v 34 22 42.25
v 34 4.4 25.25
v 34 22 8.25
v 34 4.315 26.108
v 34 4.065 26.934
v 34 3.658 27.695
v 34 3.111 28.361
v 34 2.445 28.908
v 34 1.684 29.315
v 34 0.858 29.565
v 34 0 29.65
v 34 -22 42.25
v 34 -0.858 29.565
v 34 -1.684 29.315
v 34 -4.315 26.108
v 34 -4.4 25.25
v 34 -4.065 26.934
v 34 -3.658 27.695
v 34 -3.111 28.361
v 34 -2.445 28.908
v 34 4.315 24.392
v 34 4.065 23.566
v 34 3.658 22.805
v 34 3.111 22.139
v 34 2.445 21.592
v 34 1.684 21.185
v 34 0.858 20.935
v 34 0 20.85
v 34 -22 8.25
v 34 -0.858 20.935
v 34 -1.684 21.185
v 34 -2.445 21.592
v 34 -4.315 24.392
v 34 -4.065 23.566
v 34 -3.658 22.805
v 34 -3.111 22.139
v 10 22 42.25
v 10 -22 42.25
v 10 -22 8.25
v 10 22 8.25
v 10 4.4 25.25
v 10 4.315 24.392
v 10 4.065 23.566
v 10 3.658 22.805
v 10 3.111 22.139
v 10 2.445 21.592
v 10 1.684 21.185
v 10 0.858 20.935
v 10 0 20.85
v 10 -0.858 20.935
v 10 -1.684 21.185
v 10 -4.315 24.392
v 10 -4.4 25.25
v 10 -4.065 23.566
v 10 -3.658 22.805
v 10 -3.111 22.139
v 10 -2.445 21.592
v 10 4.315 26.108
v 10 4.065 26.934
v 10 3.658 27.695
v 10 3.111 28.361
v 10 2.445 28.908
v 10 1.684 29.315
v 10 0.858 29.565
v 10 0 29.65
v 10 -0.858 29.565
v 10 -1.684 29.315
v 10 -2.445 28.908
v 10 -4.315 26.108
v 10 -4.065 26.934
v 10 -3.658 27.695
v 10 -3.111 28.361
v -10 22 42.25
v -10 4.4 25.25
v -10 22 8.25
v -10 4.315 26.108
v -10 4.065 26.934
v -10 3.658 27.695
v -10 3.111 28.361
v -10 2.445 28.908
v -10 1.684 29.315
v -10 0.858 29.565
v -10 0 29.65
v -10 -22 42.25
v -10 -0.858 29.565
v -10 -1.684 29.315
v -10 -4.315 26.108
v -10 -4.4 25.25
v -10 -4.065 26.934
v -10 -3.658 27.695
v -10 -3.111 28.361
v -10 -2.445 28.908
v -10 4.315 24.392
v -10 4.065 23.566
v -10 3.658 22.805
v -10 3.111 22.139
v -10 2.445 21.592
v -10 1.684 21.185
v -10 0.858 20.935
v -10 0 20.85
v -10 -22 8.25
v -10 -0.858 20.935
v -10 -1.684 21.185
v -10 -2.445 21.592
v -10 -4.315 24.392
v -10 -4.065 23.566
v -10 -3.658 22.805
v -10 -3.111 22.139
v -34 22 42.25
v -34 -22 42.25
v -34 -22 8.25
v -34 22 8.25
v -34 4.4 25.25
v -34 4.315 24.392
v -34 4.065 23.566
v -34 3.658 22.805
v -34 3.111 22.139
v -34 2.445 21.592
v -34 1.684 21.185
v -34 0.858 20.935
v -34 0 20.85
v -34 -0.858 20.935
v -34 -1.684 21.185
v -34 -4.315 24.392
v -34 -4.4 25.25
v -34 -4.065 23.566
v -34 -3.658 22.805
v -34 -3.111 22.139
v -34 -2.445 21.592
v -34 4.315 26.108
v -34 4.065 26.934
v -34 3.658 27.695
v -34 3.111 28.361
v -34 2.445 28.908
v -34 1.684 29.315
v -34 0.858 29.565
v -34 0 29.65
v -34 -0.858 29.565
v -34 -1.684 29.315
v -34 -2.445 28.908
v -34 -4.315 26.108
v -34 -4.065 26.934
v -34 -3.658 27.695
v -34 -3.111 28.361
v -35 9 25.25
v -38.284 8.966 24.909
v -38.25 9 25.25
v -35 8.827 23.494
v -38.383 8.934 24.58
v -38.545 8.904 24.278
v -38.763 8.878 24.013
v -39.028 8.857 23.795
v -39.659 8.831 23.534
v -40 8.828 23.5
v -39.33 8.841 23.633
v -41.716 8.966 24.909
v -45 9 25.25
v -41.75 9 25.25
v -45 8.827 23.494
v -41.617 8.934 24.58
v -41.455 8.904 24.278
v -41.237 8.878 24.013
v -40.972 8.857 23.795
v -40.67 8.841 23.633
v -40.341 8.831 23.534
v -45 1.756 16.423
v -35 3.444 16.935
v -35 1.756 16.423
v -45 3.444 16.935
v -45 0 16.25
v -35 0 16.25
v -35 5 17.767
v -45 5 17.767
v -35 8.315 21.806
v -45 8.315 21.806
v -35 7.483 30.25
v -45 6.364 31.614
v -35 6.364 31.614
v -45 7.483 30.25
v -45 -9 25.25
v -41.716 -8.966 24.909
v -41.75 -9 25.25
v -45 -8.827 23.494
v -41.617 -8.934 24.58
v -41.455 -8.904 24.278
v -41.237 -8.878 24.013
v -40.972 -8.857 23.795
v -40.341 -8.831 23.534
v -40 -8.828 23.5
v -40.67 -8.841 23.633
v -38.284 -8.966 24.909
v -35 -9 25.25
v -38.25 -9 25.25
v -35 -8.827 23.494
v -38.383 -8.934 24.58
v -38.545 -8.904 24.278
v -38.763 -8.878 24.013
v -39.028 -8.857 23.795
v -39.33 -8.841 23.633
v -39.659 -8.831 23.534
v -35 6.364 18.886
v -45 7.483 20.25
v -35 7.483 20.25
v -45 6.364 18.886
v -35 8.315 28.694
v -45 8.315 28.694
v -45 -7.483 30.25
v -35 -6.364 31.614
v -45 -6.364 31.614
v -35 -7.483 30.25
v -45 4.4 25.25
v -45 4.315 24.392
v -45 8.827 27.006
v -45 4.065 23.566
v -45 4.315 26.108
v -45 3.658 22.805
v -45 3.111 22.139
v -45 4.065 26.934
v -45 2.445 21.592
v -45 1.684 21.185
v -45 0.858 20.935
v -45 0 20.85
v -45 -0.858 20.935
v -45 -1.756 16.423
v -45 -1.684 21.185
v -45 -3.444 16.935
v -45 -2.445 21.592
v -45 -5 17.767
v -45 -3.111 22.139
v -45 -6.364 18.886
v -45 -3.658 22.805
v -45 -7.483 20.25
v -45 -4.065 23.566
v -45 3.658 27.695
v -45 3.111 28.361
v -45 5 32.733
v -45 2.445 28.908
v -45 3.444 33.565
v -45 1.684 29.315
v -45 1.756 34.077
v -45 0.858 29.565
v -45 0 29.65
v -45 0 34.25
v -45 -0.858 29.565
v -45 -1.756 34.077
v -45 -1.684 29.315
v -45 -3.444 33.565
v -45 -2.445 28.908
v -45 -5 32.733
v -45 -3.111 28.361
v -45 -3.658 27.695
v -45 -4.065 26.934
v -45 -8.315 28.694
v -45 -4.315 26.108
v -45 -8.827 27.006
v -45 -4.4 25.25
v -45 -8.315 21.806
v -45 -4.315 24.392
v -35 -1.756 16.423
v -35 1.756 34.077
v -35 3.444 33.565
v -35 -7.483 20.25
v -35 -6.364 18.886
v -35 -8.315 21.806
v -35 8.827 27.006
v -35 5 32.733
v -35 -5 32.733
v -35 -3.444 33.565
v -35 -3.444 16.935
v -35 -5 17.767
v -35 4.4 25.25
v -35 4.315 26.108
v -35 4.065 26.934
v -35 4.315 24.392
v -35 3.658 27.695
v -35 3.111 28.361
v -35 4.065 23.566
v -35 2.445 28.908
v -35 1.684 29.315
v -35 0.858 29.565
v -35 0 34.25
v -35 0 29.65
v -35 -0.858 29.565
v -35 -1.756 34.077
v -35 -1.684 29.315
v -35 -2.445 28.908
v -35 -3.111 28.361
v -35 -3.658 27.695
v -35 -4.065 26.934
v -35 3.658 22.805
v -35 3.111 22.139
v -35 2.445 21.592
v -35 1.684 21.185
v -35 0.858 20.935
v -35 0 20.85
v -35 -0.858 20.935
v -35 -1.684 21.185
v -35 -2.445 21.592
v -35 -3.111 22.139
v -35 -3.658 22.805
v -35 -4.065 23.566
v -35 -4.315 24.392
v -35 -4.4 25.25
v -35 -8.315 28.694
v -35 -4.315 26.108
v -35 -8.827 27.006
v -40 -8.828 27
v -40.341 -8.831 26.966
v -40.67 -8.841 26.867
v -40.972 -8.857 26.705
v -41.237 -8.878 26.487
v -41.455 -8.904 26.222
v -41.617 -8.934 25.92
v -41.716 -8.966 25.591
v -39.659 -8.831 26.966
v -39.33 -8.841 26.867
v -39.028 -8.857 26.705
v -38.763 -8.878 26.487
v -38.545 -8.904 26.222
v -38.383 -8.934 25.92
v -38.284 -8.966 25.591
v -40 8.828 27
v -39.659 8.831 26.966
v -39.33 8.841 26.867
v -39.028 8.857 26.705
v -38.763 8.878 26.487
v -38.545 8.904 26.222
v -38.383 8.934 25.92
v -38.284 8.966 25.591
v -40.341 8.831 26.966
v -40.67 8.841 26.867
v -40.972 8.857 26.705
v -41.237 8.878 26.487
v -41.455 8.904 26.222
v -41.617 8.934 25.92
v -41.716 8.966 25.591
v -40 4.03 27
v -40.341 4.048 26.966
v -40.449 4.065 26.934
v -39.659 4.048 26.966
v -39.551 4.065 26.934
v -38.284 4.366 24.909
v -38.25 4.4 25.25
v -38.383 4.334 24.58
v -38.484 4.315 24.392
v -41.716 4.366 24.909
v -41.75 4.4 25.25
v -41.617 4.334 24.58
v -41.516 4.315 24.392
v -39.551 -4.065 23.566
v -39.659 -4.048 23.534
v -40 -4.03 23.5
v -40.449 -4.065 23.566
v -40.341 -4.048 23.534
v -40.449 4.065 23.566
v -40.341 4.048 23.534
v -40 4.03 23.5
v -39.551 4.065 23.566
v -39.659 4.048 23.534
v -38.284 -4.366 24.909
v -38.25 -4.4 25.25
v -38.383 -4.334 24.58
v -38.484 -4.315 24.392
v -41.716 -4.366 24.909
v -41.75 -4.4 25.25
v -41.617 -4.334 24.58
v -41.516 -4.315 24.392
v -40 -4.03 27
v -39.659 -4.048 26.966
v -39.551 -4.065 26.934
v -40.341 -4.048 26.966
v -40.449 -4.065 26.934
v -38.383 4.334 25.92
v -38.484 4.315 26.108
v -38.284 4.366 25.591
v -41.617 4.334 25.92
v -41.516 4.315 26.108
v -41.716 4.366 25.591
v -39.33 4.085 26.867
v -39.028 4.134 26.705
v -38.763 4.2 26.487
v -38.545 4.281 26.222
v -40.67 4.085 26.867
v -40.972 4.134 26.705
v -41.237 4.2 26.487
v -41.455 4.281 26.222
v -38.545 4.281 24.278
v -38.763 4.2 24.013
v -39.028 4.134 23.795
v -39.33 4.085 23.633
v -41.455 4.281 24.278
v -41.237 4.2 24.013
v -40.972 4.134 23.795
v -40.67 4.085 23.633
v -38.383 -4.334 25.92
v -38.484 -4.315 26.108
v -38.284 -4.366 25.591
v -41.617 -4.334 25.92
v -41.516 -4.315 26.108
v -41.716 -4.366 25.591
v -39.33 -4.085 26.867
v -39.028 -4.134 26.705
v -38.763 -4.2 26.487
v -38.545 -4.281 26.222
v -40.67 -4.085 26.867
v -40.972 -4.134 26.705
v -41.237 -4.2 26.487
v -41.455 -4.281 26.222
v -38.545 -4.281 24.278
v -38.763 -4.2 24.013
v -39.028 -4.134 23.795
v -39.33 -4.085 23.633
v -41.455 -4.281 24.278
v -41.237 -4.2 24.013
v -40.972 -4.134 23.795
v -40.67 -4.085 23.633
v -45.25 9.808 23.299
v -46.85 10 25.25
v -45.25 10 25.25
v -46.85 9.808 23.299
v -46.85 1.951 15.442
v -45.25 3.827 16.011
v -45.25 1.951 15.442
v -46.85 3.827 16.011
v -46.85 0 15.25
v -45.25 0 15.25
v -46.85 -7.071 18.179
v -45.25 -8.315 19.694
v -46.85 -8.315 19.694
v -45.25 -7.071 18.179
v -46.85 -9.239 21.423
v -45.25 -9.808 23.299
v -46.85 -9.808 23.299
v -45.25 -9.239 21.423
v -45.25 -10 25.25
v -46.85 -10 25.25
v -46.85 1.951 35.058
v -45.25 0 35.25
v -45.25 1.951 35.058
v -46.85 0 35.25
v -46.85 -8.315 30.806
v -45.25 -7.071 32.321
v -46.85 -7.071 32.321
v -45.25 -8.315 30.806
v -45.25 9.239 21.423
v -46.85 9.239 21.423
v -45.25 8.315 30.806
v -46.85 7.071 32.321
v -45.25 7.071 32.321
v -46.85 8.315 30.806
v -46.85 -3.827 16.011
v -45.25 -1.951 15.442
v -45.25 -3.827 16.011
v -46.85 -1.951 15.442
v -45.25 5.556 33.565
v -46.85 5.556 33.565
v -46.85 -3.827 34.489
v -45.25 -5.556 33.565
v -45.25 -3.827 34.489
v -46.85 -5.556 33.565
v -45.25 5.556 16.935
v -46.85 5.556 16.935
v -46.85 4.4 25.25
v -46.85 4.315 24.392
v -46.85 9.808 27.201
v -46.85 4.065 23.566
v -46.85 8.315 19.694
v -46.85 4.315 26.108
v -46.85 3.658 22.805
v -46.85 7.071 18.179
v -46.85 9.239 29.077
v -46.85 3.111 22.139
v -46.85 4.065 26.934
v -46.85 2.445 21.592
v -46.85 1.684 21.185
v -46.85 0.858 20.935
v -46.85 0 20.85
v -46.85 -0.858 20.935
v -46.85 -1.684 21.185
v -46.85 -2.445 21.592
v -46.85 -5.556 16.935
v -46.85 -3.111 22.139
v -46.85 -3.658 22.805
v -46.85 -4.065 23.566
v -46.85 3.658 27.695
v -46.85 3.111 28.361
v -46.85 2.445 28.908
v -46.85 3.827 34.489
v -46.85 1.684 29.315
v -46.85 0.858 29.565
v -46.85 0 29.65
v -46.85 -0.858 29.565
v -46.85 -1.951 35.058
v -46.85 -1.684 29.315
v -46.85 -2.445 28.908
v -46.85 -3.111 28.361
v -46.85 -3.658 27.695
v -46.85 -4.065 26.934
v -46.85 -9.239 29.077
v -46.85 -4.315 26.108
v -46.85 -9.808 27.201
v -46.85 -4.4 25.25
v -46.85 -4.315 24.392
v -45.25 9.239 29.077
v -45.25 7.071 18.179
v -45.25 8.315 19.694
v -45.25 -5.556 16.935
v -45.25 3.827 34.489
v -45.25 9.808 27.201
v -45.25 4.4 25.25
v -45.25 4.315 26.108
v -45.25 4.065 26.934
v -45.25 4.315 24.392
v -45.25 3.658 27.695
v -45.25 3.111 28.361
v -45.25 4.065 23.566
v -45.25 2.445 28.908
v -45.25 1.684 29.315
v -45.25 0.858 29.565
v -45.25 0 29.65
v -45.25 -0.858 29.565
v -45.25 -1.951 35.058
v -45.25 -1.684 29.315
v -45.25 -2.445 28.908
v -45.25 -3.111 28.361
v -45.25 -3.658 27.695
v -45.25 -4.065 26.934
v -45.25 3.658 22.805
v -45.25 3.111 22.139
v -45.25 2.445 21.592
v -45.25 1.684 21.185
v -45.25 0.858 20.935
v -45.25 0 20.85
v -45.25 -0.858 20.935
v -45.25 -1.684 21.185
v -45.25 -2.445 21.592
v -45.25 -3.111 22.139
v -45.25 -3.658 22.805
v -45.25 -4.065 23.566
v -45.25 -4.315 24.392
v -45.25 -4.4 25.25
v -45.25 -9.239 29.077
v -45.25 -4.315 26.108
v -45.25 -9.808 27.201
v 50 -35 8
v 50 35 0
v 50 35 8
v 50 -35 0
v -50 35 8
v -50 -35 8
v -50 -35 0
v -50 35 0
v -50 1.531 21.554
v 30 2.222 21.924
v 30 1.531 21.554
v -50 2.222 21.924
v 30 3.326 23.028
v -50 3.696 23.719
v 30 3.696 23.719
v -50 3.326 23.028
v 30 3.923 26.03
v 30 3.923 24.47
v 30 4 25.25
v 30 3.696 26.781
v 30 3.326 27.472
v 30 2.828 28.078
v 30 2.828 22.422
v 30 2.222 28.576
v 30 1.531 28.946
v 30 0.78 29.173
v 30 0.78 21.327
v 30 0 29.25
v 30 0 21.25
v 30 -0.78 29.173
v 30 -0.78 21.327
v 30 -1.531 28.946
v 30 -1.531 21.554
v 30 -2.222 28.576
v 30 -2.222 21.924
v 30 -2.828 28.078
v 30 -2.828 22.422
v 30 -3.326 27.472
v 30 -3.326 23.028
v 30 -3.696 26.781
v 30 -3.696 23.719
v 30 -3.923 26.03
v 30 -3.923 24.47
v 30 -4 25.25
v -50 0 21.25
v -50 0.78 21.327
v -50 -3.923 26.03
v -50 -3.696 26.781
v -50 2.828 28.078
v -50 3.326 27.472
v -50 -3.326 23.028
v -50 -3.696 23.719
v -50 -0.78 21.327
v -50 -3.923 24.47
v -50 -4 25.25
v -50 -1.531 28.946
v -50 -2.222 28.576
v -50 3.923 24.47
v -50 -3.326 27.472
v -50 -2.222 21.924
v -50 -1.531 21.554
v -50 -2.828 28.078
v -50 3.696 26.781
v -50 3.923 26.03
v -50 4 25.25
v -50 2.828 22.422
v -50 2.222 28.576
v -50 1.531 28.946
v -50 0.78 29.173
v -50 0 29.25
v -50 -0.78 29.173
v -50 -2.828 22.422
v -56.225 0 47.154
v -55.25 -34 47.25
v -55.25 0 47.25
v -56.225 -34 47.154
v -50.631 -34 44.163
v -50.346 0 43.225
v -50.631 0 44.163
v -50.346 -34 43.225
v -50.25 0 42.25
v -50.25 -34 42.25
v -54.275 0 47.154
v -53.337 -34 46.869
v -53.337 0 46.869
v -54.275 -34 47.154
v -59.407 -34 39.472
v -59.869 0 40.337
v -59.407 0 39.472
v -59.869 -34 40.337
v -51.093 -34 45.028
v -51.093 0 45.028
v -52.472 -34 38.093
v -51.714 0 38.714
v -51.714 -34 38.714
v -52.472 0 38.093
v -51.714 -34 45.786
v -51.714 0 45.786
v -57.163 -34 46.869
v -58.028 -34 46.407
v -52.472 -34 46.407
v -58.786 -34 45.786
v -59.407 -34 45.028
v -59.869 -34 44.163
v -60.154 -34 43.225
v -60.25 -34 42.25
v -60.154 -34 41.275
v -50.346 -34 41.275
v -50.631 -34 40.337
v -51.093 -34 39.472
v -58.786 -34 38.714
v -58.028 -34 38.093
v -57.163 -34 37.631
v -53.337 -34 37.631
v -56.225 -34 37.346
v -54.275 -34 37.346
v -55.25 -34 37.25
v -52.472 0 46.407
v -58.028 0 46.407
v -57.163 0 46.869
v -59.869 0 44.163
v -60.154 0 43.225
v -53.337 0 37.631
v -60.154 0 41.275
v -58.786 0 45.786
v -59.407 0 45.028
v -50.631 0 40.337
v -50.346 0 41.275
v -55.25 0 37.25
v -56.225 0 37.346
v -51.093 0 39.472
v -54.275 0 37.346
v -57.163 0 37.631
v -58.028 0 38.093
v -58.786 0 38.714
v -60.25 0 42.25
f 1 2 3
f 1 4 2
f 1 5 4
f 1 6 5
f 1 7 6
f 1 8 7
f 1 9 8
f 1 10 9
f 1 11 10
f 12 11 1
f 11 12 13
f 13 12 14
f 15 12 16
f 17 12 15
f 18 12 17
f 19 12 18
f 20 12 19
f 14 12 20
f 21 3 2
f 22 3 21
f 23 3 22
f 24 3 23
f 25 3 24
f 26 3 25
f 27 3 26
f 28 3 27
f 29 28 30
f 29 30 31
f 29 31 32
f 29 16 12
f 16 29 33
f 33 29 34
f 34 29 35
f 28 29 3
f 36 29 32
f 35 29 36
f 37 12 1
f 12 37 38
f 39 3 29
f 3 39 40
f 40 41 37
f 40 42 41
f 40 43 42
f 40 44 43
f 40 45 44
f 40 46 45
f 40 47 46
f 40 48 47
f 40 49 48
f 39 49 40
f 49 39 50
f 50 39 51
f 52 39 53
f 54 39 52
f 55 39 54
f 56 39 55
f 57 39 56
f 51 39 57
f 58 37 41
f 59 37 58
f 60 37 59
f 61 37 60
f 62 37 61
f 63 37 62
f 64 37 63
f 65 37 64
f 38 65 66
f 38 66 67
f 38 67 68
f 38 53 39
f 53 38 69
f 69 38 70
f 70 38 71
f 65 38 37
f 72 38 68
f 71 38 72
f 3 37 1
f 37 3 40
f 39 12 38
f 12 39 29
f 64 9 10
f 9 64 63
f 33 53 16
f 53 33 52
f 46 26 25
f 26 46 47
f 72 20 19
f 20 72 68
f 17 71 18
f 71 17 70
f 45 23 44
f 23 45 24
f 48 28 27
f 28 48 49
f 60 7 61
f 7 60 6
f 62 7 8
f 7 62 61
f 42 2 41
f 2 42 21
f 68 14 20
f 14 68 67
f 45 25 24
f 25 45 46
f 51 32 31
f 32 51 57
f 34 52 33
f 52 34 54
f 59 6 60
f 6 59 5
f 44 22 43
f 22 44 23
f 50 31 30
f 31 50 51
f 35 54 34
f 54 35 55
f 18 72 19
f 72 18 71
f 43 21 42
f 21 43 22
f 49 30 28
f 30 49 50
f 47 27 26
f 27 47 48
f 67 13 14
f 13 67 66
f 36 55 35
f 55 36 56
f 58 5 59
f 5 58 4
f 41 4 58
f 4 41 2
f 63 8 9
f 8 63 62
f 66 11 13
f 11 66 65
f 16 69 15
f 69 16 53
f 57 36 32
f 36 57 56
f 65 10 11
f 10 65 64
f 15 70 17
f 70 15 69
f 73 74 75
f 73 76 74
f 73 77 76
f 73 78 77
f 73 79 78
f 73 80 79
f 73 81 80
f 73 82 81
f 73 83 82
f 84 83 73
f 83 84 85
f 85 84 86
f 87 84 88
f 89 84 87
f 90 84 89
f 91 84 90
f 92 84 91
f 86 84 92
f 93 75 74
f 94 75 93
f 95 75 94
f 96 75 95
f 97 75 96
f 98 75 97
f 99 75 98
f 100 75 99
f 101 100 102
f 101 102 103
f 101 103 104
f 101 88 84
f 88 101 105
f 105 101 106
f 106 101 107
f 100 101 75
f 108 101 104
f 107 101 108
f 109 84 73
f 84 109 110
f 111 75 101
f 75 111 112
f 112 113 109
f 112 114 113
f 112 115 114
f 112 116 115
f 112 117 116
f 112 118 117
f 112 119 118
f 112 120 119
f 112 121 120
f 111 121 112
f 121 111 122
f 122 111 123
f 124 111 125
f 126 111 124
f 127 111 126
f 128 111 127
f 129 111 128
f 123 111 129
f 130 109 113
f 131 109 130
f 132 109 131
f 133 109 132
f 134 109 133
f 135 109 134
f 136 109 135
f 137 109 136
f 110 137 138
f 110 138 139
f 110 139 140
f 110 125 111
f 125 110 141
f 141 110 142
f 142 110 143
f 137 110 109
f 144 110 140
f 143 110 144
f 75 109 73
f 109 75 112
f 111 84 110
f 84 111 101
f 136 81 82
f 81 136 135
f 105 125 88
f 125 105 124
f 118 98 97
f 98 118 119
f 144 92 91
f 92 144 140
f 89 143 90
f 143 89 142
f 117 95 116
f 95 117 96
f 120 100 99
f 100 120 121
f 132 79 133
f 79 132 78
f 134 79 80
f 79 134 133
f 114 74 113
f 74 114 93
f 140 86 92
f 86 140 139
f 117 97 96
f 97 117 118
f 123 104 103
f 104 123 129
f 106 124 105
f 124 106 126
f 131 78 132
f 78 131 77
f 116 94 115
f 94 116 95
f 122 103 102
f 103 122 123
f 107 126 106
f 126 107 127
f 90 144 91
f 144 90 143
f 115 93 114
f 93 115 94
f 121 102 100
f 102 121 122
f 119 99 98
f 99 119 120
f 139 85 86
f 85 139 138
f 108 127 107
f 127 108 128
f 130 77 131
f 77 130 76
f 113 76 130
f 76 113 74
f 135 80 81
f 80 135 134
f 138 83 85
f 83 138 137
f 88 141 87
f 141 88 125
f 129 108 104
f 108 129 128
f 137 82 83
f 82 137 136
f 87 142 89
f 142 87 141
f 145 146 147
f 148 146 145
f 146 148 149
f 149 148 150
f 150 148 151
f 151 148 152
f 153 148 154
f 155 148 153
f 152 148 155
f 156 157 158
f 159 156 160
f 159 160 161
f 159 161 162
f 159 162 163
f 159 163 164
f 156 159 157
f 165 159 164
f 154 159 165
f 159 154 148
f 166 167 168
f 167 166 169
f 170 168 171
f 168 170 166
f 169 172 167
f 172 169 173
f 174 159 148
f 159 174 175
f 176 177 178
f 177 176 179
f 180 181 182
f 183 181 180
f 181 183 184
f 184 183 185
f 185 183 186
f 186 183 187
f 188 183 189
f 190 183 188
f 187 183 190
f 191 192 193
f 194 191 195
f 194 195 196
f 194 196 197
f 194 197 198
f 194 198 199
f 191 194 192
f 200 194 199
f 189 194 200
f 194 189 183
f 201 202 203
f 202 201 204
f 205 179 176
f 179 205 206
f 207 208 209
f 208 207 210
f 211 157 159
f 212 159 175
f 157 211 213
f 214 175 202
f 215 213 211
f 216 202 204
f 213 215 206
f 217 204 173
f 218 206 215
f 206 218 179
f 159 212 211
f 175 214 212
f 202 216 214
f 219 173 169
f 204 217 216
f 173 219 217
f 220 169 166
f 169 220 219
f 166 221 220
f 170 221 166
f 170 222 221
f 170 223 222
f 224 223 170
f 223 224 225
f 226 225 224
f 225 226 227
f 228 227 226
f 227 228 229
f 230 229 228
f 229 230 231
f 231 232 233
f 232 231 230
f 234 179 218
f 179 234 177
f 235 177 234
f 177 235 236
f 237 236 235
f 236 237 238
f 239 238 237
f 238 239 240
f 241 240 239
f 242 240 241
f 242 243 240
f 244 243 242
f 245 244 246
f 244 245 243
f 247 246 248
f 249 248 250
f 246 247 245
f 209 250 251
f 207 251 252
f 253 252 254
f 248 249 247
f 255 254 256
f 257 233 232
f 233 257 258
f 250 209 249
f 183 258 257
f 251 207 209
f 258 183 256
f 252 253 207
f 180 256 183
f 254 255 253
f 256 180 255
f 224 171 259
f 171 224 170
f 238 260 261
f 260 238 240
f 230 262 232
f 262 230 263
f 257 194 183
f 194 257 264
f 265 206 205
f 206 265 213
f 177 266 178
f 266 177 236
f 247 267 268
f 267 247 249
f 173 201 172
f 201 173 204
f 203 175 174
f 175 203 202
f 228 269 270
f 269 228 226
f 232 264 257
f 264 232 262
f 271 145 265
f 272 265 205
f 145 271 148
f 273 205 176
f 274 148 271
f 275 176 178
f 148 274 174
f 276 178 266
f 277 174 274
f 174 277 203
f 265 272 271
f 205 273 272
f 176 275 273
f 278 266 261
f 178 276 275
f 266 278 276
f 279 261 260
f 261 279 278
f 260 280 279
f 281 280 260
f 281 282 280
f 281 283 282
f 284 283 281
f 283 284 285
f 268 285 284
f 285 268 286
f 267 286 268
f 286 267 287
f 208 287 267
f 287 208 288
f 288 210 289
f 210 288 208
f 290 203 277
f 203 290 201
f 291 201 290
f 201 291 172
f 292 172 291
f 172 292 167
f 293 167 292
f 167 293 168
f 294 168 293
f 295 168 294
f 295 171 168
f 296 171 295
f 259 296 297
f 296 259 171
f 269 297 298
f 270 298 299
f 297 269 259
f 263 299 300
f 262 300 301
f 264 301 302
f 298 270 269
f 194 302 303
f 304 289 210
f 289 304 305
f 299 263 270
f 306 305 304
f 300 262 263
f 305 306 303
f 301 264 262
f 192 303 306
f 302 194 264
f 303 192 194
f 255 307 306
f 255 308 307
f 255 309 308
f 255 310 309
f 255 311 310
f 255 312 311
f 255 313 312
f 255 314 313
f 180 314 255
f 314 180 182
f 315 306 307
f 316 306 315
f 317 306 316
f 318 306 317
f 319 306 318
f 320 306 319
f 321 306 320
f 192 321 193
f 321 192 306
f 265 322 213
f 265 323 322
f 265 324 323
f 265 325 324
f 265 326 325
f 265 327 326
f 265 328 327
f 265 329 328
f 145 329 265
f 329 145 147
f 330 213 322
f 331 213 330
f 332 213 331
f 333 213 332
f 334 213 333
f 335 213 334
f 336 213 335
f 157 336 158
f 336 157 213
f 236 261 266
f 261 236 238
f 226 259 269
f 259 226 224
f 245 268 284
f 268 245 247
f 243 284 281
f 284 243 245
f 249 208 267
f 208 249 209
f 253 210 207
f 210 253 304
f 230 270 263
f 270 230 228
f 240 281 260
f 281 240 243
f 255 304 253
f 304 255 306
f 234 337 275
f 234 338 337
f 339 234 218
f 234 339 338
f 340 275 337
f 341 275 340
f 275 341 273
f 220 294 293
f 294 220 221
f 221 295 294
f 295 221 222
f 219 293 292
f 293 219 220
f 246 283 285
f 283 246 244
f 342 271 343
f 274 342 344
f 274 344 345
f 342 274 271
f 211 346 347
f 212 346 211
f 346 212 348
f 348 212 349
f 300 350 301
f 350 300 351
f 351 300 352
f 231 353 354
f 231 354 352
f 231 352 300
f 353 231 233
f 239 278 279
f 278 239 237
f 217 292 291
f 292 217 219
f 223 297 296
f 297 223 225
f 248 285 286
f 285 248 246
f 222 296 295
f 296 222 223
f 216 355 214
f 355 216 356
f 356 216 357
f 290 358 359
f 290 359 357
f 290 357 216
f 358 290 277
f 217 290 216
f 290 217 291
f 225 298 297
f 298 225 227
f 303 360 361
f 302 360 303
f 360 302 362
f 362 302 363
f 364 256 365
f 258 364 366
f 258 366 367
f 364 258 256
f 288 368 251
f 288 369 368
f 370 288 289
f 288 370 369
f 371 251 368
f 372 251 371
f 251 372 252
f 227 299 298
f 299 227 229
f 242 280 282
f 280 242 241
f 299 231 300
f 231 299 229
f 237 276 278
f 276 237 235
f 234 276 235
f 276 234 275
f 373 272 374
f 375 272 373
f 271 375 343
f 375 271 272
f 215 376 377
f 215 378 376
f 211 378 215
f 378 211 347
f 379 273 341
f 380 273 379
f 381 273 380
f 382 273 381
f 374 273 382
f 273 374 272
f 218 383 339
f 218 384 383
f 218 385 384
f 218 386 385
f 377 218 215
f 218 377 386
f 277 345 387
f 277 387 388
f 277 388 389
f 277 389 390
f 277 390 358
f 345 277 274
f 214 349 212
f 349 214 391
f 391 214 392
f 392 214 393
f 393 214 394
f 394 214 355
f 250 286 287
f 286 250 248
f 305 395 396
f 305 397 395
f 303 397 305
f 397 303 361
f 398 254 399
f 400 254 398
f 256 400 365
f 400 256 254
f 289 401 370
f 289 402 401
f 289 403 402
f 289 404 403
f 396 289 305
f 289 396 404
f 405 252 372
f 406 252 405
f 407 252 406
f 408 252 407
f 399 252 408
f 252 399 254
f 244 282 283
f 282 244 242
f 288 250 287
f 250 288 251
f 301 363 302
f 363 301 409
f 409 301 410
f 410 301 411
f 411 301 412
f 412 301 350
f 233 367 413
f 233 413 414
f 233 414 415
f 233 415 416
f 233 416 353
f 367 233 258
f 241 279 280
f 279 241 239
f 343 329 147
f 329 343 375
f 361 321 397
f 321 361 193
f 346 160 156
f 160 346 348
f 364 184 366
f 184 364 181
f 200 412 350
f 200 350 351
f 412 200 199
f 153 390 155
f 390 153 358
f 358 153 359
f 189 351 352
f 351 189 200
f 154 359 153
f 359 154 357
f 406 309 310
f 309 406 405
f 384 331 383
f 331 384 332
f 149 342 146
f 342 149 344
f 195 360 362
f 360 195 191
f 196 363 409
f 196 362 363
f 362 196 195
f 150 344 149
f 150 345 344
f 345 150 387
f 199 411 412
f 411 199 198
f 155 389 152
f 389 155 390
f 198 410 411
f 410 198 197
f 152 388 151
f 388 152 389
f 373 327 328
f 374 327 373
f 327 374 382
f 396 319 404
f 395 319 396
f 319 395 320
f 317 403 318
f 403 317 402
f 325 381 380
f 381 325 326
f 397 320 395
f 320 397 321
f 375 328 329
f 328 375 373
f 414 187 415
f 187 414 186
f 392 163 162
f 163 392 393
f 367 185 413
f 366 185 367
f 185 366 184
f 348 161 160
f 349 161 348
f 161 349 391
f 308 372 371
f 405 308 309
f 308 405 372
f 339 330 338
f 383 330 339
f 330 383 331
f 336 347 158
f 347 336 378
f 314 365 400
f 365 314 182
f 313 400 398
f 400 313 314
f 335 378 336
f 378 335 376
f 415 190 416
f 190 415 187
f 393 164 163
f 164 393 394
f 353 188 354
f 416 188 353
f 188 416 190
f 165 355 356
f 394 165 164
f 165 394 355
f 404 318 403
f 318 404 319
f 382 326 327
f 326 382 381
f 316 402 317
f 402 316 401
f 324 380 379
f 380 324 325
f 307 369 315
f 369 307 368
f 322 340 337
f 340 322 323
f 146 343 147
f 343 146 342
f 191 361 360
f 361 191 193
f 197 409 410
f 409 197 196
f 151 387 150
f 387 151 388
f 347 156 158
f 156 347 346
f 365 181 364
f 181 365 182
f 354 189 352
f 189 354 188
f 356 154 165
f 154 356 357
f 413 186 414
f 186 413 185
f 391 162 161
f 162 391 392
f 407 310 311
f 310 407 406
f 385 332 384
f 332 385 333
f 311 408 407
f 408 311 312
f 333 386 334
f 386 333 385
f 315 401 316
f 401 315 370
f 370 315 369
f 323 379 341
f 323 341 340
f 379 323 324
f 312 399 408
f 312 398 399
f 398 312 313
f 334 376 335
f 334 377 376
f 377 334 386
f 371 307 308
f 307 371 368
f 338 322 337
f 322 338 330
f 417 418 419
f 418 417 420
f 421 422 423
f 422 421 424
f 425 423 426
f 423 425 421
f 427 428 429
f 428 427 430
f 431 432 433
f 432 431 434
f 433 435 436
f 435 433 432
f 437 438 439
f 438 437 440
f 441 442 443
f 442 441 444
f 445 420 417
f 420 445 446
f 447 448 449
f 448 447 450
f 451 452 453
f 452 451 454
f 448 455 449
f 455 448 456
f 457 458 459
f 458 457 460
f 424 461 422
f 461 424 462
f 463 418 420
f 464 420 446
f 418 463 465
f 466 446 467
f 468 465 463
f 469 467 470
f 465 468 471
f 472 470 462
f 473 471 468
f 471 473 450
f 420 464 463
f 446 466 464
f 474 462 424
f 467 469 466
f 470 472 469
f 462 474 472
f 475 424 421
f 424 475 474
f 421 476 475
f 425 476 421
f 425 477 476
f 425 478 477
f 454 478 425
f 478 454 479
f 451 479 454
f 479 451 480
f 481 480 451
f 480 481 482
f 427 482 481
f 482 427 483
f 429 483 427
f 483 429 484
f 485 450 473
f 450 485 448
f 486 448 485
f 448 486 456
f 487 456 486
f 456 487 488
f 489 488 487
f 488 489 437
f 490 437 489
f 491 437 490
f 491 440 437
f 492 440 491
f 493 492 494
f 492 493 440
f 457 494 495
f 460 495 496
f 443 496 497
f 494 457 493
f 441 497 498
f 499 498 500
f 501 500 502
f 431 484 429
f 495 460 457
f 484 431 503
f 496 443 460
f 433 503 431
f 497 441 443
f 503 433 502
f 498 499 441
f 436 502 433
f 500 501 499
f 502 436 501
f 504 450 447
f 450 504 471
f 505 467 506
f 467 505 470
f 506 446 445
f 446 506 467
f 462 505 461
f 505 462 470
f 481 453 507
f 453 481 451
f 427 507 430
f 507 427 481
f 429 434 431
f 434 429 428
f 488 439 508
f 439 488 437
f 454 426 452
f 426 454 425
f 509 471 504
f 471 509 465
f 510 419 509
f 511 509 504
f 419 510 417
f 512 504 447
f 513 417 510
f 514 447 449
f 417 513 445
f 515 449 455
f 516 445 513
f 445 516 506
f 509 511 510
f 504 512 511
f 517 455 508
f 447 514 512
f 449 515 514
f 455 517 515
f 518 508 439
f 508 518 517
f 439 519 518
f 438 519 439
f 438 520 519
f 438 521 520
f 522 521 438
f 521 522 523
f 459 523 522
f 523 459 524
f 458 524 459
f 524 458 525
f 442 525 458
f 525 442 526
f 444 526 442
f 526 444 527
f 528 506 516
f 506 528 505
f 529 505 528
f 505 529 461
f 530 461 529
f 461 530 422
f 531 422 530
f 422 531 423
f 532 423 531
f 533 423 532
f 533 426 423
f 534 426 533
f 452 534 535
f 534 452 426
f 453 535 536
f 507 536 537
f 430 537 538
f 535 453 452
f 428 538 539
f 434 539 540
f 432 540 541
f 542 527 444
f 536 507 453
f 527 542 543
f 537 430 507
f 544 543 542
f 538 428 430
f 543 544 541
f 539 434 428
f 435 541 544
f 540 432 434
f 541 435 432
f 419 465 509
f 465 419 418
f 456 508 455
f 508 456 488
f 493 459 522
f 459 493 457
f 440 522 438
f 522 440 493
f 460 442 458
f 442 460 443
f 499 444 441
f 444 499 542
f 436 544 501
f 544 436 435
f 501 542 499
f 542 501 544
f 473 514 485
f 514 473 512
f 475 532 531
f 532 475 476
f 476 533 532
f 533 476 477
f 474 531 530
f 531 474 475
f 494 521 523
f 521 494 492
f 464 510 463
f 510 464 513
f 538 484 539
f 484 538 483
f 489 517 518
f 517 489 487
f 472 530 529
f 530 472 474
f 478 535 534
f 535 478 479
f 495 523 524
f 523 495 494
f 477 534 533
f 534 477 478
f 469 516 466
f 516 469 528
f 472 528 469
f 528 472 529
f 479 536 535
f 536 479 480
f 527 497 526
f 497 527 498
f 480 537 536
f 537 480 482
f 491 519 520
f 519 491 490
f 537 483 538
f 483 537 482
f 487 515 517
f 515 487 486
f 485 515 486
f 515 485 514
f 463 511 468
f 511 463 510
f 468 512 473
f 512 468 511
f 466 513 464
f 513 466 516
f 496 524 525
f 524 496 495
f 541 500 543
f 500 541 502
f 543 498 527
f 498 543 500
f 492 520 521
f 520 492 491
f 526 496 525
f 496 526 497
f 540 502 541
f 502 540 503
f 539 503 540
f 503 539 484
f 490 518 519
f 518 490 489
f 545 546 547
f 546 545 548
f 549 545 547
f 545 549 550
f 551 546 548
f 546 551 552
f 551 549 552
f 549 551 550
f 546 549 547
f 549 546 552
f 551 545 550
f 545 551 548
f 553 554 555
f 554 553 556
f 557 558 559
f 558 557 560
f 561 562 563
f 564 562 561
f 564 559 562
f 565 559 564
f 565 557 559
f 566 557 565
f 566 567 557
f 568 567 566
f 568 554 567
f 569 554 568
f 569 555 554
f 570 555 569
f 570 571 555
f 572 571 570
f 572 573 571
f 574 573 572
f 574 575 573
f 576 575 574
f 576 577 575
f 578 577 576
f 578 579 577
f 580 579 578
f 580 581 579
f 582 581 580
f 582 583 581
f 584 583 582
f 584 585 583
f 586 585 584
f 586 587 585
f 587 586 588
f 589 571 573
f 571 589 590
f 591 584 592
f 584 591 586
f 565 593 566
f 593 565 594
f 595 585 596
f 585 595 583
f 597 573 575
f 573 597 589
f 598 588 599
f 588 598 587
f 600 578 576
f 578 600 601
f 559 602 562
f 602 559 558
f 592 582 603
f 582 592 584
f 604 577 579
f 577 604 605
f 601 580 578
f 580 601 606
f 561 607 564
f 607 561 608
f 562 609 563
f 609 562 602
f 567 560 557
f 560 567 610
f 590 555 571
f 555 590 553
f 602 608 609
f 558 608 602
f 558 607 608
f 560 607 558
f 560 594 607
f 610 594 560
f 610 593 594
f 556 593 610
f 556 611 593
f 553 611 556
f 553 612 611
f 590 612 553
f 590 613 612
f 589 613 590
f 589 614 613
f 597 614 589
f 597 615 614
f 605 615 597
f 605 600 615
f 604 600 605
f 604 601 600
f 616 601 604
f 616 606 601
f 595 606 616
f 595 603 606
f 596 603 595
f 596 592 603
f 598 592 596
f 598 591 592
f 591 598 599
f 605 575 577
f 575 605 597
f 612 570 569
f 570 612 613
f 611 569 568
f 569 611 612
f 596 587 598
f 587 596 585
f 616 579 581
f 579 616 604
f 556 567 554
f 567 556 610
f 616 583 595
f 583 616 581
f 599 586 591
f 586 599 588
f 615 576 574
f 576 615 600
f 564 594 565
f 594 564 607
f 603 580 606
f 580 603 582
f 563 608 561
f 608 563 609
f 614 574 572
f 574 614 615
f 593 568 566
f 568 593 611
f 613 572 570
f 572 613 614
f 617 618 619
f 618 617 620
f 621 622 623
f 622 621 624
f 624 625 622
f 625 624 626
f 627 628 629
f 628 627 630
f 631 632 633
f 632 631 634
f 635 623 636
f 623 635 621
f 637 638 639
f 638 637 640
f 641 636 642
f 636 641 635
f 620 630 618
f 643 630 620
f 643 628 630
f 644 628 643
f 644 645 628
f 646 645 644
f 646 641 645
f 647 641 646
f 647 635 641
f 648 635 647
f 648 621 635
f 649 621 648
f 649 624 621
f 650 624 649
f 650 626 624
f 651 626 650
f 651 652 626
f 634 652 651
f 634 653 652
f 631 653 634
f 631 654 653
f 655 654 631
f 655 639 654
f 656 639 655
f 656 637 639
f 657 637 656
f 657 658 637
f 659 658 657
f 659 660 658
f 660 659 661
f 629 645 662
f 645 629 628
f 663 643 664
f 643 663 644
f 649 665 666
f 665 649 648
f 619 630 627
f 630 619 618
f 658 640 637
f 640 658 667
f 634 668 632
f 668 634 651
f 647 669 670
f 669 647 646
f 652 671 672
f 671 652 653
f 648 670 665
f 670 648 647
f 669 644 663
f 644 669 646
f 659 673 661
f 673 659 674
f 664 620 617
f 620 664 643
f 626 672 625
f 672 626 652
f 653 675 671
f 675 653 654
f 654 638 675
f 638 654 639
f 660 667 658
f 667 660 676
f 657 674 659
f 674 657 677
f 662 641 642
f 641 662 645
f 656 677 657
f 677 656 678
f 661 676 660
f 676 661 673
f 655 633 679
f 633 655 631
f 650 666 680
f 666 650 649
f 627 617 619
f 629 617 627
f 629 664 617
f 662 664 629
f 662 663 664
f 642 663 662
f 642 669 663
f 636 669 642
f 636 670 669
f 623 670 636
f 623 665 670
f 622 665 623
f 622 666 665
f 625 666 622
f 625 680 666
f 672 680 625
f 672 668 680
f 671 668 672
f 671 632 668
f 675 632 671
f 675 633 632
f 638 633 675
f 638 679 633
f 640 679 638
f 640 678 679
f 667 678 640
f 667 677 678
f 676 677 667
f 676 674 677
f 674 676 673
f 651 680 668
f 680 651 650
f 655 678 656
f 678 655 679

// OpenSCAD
$fn = 32;

// ------------------------------------------------------------------------
// Machine vise: screw d8, jaws 24 x 34 mm
// Every part is its own module, assembly() places every instance.
// ------------------------------------------------------------------------

// --- part 1 ---
module vise_bed() {
  difference() {
    translate([-50, -35, 0]) cube([100, 70, 8]);
  }
}

// --- part 2 ---
module vise_jaw() {
  difference() {
    translate([-12, -22, 0]) cube([24, 44, 34]);
    translate([0, 0, 17]) rotate([0, 90, 0]) cylinder(h = 26, d = 8.8, center = true);
  }
}

// --- part 3 ---
module vise_screw() {
  translate([0, 0, -40]) cylinder(h = 80, d = 8);
}

// --- part 4 ---
module screw_collar() {
  difference() {
    cylinder(h = 10, d = 18);
    translate([0, 0, -1]) cylinder(h = 12, d = 8.8);
    translate([0, 0, 5]) rotate([90, 0, 0]) cylinder(h = 20, d = 3.5, center = true);
  }
}

// --- part 5 ---
module screw_washer() {
  difference() {
      translate([0, 0, 0]) cylinder(h = 1.6, d = 20);
      translate([0, 0, -1]) cylinder(h = 3.6, d = 8.8);
    }
}

// --- part 6 ---
module vise_handle() {
  cylinder(h = 34, d = 10);
}

// --- assembly ---
module assembly() {
  color([0.80, 0.24, 0.20]) translate([0, 0, 0]) rotate([0, 0, 0]) vise_bed();
  color([0.20, 0.45, 0.75]) translate([22, 0, 8.25]) rotate([0, 0, 0]) vise_jaw();
  color([0.25, 0.62, 0.32]) translate([-22, 0, 8.25]) rotate([0, 0, 0]) vise_jaw();
  color([0.92, 0.70, 0.18]) translate([-10, 0, 25.25]) rotate([0, 90, 0]) vise_screw();
  color([0.58, 0.35, 0.70]) translate([-45, 0, 25.25]) rotate([0, 90, 0]) screw_collar();
  color([0.16, 0.66, 0.66]) translate([-46.85, 0, 25.25]) rotate([0, 90, 0]) screw_washer();
  color([0.85, 0.48, 0.18]) translate([-55.25, 0, 42.25]) rotate([90, 0, 0]) vise_handle();
}

assembly();
